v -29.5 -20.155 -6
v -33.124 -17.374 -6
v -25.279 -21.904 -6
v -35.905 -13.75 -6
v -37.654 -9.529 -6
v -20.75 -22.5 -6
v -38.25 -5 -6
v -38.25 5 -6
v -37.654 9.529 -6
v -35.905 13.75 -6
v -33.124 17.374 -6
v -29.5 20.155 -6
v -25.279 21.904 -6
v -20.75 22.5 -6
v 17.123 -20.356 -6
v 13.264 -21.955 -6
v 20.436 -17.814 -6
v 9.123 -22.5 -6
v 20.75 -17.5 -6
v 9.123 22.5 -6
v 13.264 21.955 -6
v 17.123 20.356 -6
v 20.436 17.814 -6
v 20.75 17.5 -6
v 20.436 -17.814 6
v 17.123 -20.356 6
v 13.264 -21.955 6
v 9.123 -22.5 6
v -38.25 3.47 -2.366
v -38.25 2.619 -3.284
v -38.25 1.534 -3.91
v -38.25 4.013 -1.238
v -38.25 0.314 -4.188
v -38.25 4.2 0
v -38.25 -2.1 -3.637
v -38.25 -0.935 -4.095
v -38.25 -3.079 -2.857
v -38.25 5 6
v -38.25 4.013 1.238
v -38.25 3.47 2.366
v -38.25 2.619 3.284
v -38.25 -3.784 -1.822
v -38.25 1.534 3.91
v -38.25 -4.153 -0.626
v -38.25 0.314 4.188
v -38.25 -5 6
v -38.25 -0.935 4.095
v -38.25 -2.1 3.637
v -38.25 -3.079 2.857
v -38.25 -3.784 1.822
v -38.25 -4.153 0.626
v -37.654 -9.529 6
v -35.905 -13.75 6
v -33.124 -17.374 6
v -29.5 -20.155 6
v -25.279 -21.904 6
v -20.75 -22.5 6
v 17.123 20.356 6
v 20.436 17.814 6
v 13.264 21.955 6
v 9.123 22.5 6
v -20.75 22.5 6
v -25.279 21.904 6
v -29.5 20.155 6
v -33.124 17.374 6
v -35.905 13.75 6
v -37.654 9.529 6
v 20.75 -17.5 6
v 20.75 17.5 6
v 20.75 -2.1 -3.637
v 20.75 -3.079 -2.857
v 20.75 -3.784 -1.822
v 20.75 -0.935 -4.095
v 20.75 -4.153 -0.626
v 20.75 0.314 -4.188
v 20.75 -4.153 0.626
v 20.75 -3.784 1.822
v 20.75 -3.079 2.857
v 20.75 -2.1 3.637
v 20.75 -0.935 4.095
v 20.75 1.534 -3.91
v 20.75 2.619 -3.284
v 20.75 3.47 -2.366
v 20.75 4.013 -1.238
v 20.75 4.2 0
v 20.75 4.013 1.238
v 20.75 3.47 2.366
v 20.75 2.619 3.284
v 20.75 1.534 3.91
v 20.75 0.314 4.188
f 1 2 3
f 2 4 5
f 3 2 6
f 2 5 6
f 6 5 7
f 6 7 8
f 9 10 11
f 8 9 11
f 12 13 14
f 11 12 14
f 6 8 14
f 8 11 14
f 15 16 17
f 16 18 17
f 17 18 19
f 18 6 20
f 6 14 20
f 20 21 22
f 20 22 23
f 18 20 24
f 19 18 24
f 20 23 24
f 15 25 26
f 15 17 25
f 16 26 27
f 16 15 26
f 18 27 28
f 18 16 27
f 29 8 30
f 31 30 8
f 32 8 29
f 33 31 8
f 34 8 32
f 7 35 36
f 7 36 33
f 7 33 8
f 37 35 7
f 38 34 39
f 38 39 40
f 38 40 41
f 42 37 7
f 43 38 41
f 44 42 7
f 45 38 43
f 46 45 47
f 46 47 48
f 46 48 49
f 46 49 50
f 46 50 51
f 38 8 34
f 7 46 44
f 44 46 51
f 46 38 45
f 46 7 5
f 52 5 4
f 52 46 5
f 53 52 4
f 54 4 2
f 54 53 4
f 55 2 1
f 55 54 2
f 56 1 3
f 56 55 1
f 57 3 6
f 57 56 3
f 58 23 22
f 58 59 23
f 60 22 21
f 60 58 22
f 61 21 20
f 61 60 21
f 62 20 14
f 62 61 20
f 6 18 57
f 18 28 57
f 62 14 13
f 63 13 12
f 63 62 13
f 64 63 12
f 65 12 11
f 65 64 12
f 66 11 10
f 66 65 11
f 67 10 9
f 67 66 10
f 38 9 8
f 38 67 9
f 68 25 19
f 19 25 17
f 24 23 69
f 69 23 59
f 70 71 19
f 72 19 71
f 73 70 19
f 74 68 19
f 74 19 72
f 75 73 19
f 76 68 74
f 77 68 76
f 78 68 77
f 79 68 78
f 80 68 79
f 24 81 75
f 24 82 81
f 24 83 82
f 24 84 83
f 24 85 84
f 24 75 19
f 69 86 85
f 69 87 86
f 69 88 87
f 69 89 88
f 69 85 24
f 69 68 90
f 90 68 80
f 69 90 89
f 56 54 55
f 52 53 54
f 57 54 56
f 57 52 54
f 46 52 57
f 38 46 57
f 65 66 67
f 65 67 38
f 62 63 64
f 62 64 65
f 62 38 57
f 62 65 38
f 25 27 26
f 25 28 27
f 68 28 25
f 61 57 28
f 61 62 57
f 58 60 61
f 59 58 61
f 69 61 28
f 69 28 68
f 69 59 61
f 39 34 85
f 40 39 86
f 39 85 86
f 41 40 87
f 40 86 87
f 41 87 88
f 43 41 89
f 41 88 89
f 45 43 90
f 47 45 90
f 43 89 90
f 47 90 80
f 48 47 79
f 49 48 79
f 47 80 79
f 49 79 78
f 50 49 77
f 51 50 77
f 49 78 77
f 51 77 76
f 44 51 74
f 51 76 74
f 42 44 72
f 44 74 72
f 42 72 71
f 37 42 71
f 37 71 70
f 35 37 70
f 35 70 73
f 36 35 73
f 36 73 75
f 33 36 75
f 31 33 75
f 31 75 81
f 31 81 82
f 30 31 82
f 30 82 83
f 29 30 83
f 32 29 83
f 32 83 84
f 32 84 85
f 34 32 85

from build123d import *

# Parameters (mm, degrees)
PAD_DEPTH    = 6
SKETCH002_R  = 4.2
POCKET_DEPTH = 59.001
CHAMFER_SIZE = 5
FILLET_R     = 16


with BuildPart() as part:
    # Sketch → Pad (new body, symmetric)
    with BuildSketch(Plane.XY):
        with BuildLine():
            Line((20.75, -22.5), (20.75, 22.5))
            Line((20.75, 22.5), (-20.75, 22.5))
            ThreePointArc((-20.75, 22.5), (-33.124369, 17.374369), (-38.25, 5))
            Line((-38.25, 5), (-38.25, -5))
            ThreePointArc((-38.25, -5), (-33.124369, -17.374369), (-20.75, -22.5))
            Line((20.75, -22.5), (-20.75, -22.5))
        make_face()
    extrude(amount=PAD_DEPTH, both=True)

    # Sketch002 → Pocket (cut, through all)
    with BuildSketch(Plane.YZ.offset(20.75)):
        Circle(SKETCH002_R)
    extrude(amount=-POCKET_DEPTH, mode=Mode.SUBTRACT)

    # Chamfer
    chamfer_edges = [part.edges().sort_by_distance(p)[0] for p in [
        (20.75, 22.5, 0),
        (20.75, -22.5, 0),
    ]]
    chamfer(chamfer_edges, length=CHAMFER_SIZE)

    # Fillet
    fillet_edges = [part.edges().sort_by_distance(p)[0] for p in [
        (15.75, 22.5, 0),
        (15.75, -22.5, 0),
    ]]
    fillet(fillet_edges, radius=FILLET_R)


solid = part.part
